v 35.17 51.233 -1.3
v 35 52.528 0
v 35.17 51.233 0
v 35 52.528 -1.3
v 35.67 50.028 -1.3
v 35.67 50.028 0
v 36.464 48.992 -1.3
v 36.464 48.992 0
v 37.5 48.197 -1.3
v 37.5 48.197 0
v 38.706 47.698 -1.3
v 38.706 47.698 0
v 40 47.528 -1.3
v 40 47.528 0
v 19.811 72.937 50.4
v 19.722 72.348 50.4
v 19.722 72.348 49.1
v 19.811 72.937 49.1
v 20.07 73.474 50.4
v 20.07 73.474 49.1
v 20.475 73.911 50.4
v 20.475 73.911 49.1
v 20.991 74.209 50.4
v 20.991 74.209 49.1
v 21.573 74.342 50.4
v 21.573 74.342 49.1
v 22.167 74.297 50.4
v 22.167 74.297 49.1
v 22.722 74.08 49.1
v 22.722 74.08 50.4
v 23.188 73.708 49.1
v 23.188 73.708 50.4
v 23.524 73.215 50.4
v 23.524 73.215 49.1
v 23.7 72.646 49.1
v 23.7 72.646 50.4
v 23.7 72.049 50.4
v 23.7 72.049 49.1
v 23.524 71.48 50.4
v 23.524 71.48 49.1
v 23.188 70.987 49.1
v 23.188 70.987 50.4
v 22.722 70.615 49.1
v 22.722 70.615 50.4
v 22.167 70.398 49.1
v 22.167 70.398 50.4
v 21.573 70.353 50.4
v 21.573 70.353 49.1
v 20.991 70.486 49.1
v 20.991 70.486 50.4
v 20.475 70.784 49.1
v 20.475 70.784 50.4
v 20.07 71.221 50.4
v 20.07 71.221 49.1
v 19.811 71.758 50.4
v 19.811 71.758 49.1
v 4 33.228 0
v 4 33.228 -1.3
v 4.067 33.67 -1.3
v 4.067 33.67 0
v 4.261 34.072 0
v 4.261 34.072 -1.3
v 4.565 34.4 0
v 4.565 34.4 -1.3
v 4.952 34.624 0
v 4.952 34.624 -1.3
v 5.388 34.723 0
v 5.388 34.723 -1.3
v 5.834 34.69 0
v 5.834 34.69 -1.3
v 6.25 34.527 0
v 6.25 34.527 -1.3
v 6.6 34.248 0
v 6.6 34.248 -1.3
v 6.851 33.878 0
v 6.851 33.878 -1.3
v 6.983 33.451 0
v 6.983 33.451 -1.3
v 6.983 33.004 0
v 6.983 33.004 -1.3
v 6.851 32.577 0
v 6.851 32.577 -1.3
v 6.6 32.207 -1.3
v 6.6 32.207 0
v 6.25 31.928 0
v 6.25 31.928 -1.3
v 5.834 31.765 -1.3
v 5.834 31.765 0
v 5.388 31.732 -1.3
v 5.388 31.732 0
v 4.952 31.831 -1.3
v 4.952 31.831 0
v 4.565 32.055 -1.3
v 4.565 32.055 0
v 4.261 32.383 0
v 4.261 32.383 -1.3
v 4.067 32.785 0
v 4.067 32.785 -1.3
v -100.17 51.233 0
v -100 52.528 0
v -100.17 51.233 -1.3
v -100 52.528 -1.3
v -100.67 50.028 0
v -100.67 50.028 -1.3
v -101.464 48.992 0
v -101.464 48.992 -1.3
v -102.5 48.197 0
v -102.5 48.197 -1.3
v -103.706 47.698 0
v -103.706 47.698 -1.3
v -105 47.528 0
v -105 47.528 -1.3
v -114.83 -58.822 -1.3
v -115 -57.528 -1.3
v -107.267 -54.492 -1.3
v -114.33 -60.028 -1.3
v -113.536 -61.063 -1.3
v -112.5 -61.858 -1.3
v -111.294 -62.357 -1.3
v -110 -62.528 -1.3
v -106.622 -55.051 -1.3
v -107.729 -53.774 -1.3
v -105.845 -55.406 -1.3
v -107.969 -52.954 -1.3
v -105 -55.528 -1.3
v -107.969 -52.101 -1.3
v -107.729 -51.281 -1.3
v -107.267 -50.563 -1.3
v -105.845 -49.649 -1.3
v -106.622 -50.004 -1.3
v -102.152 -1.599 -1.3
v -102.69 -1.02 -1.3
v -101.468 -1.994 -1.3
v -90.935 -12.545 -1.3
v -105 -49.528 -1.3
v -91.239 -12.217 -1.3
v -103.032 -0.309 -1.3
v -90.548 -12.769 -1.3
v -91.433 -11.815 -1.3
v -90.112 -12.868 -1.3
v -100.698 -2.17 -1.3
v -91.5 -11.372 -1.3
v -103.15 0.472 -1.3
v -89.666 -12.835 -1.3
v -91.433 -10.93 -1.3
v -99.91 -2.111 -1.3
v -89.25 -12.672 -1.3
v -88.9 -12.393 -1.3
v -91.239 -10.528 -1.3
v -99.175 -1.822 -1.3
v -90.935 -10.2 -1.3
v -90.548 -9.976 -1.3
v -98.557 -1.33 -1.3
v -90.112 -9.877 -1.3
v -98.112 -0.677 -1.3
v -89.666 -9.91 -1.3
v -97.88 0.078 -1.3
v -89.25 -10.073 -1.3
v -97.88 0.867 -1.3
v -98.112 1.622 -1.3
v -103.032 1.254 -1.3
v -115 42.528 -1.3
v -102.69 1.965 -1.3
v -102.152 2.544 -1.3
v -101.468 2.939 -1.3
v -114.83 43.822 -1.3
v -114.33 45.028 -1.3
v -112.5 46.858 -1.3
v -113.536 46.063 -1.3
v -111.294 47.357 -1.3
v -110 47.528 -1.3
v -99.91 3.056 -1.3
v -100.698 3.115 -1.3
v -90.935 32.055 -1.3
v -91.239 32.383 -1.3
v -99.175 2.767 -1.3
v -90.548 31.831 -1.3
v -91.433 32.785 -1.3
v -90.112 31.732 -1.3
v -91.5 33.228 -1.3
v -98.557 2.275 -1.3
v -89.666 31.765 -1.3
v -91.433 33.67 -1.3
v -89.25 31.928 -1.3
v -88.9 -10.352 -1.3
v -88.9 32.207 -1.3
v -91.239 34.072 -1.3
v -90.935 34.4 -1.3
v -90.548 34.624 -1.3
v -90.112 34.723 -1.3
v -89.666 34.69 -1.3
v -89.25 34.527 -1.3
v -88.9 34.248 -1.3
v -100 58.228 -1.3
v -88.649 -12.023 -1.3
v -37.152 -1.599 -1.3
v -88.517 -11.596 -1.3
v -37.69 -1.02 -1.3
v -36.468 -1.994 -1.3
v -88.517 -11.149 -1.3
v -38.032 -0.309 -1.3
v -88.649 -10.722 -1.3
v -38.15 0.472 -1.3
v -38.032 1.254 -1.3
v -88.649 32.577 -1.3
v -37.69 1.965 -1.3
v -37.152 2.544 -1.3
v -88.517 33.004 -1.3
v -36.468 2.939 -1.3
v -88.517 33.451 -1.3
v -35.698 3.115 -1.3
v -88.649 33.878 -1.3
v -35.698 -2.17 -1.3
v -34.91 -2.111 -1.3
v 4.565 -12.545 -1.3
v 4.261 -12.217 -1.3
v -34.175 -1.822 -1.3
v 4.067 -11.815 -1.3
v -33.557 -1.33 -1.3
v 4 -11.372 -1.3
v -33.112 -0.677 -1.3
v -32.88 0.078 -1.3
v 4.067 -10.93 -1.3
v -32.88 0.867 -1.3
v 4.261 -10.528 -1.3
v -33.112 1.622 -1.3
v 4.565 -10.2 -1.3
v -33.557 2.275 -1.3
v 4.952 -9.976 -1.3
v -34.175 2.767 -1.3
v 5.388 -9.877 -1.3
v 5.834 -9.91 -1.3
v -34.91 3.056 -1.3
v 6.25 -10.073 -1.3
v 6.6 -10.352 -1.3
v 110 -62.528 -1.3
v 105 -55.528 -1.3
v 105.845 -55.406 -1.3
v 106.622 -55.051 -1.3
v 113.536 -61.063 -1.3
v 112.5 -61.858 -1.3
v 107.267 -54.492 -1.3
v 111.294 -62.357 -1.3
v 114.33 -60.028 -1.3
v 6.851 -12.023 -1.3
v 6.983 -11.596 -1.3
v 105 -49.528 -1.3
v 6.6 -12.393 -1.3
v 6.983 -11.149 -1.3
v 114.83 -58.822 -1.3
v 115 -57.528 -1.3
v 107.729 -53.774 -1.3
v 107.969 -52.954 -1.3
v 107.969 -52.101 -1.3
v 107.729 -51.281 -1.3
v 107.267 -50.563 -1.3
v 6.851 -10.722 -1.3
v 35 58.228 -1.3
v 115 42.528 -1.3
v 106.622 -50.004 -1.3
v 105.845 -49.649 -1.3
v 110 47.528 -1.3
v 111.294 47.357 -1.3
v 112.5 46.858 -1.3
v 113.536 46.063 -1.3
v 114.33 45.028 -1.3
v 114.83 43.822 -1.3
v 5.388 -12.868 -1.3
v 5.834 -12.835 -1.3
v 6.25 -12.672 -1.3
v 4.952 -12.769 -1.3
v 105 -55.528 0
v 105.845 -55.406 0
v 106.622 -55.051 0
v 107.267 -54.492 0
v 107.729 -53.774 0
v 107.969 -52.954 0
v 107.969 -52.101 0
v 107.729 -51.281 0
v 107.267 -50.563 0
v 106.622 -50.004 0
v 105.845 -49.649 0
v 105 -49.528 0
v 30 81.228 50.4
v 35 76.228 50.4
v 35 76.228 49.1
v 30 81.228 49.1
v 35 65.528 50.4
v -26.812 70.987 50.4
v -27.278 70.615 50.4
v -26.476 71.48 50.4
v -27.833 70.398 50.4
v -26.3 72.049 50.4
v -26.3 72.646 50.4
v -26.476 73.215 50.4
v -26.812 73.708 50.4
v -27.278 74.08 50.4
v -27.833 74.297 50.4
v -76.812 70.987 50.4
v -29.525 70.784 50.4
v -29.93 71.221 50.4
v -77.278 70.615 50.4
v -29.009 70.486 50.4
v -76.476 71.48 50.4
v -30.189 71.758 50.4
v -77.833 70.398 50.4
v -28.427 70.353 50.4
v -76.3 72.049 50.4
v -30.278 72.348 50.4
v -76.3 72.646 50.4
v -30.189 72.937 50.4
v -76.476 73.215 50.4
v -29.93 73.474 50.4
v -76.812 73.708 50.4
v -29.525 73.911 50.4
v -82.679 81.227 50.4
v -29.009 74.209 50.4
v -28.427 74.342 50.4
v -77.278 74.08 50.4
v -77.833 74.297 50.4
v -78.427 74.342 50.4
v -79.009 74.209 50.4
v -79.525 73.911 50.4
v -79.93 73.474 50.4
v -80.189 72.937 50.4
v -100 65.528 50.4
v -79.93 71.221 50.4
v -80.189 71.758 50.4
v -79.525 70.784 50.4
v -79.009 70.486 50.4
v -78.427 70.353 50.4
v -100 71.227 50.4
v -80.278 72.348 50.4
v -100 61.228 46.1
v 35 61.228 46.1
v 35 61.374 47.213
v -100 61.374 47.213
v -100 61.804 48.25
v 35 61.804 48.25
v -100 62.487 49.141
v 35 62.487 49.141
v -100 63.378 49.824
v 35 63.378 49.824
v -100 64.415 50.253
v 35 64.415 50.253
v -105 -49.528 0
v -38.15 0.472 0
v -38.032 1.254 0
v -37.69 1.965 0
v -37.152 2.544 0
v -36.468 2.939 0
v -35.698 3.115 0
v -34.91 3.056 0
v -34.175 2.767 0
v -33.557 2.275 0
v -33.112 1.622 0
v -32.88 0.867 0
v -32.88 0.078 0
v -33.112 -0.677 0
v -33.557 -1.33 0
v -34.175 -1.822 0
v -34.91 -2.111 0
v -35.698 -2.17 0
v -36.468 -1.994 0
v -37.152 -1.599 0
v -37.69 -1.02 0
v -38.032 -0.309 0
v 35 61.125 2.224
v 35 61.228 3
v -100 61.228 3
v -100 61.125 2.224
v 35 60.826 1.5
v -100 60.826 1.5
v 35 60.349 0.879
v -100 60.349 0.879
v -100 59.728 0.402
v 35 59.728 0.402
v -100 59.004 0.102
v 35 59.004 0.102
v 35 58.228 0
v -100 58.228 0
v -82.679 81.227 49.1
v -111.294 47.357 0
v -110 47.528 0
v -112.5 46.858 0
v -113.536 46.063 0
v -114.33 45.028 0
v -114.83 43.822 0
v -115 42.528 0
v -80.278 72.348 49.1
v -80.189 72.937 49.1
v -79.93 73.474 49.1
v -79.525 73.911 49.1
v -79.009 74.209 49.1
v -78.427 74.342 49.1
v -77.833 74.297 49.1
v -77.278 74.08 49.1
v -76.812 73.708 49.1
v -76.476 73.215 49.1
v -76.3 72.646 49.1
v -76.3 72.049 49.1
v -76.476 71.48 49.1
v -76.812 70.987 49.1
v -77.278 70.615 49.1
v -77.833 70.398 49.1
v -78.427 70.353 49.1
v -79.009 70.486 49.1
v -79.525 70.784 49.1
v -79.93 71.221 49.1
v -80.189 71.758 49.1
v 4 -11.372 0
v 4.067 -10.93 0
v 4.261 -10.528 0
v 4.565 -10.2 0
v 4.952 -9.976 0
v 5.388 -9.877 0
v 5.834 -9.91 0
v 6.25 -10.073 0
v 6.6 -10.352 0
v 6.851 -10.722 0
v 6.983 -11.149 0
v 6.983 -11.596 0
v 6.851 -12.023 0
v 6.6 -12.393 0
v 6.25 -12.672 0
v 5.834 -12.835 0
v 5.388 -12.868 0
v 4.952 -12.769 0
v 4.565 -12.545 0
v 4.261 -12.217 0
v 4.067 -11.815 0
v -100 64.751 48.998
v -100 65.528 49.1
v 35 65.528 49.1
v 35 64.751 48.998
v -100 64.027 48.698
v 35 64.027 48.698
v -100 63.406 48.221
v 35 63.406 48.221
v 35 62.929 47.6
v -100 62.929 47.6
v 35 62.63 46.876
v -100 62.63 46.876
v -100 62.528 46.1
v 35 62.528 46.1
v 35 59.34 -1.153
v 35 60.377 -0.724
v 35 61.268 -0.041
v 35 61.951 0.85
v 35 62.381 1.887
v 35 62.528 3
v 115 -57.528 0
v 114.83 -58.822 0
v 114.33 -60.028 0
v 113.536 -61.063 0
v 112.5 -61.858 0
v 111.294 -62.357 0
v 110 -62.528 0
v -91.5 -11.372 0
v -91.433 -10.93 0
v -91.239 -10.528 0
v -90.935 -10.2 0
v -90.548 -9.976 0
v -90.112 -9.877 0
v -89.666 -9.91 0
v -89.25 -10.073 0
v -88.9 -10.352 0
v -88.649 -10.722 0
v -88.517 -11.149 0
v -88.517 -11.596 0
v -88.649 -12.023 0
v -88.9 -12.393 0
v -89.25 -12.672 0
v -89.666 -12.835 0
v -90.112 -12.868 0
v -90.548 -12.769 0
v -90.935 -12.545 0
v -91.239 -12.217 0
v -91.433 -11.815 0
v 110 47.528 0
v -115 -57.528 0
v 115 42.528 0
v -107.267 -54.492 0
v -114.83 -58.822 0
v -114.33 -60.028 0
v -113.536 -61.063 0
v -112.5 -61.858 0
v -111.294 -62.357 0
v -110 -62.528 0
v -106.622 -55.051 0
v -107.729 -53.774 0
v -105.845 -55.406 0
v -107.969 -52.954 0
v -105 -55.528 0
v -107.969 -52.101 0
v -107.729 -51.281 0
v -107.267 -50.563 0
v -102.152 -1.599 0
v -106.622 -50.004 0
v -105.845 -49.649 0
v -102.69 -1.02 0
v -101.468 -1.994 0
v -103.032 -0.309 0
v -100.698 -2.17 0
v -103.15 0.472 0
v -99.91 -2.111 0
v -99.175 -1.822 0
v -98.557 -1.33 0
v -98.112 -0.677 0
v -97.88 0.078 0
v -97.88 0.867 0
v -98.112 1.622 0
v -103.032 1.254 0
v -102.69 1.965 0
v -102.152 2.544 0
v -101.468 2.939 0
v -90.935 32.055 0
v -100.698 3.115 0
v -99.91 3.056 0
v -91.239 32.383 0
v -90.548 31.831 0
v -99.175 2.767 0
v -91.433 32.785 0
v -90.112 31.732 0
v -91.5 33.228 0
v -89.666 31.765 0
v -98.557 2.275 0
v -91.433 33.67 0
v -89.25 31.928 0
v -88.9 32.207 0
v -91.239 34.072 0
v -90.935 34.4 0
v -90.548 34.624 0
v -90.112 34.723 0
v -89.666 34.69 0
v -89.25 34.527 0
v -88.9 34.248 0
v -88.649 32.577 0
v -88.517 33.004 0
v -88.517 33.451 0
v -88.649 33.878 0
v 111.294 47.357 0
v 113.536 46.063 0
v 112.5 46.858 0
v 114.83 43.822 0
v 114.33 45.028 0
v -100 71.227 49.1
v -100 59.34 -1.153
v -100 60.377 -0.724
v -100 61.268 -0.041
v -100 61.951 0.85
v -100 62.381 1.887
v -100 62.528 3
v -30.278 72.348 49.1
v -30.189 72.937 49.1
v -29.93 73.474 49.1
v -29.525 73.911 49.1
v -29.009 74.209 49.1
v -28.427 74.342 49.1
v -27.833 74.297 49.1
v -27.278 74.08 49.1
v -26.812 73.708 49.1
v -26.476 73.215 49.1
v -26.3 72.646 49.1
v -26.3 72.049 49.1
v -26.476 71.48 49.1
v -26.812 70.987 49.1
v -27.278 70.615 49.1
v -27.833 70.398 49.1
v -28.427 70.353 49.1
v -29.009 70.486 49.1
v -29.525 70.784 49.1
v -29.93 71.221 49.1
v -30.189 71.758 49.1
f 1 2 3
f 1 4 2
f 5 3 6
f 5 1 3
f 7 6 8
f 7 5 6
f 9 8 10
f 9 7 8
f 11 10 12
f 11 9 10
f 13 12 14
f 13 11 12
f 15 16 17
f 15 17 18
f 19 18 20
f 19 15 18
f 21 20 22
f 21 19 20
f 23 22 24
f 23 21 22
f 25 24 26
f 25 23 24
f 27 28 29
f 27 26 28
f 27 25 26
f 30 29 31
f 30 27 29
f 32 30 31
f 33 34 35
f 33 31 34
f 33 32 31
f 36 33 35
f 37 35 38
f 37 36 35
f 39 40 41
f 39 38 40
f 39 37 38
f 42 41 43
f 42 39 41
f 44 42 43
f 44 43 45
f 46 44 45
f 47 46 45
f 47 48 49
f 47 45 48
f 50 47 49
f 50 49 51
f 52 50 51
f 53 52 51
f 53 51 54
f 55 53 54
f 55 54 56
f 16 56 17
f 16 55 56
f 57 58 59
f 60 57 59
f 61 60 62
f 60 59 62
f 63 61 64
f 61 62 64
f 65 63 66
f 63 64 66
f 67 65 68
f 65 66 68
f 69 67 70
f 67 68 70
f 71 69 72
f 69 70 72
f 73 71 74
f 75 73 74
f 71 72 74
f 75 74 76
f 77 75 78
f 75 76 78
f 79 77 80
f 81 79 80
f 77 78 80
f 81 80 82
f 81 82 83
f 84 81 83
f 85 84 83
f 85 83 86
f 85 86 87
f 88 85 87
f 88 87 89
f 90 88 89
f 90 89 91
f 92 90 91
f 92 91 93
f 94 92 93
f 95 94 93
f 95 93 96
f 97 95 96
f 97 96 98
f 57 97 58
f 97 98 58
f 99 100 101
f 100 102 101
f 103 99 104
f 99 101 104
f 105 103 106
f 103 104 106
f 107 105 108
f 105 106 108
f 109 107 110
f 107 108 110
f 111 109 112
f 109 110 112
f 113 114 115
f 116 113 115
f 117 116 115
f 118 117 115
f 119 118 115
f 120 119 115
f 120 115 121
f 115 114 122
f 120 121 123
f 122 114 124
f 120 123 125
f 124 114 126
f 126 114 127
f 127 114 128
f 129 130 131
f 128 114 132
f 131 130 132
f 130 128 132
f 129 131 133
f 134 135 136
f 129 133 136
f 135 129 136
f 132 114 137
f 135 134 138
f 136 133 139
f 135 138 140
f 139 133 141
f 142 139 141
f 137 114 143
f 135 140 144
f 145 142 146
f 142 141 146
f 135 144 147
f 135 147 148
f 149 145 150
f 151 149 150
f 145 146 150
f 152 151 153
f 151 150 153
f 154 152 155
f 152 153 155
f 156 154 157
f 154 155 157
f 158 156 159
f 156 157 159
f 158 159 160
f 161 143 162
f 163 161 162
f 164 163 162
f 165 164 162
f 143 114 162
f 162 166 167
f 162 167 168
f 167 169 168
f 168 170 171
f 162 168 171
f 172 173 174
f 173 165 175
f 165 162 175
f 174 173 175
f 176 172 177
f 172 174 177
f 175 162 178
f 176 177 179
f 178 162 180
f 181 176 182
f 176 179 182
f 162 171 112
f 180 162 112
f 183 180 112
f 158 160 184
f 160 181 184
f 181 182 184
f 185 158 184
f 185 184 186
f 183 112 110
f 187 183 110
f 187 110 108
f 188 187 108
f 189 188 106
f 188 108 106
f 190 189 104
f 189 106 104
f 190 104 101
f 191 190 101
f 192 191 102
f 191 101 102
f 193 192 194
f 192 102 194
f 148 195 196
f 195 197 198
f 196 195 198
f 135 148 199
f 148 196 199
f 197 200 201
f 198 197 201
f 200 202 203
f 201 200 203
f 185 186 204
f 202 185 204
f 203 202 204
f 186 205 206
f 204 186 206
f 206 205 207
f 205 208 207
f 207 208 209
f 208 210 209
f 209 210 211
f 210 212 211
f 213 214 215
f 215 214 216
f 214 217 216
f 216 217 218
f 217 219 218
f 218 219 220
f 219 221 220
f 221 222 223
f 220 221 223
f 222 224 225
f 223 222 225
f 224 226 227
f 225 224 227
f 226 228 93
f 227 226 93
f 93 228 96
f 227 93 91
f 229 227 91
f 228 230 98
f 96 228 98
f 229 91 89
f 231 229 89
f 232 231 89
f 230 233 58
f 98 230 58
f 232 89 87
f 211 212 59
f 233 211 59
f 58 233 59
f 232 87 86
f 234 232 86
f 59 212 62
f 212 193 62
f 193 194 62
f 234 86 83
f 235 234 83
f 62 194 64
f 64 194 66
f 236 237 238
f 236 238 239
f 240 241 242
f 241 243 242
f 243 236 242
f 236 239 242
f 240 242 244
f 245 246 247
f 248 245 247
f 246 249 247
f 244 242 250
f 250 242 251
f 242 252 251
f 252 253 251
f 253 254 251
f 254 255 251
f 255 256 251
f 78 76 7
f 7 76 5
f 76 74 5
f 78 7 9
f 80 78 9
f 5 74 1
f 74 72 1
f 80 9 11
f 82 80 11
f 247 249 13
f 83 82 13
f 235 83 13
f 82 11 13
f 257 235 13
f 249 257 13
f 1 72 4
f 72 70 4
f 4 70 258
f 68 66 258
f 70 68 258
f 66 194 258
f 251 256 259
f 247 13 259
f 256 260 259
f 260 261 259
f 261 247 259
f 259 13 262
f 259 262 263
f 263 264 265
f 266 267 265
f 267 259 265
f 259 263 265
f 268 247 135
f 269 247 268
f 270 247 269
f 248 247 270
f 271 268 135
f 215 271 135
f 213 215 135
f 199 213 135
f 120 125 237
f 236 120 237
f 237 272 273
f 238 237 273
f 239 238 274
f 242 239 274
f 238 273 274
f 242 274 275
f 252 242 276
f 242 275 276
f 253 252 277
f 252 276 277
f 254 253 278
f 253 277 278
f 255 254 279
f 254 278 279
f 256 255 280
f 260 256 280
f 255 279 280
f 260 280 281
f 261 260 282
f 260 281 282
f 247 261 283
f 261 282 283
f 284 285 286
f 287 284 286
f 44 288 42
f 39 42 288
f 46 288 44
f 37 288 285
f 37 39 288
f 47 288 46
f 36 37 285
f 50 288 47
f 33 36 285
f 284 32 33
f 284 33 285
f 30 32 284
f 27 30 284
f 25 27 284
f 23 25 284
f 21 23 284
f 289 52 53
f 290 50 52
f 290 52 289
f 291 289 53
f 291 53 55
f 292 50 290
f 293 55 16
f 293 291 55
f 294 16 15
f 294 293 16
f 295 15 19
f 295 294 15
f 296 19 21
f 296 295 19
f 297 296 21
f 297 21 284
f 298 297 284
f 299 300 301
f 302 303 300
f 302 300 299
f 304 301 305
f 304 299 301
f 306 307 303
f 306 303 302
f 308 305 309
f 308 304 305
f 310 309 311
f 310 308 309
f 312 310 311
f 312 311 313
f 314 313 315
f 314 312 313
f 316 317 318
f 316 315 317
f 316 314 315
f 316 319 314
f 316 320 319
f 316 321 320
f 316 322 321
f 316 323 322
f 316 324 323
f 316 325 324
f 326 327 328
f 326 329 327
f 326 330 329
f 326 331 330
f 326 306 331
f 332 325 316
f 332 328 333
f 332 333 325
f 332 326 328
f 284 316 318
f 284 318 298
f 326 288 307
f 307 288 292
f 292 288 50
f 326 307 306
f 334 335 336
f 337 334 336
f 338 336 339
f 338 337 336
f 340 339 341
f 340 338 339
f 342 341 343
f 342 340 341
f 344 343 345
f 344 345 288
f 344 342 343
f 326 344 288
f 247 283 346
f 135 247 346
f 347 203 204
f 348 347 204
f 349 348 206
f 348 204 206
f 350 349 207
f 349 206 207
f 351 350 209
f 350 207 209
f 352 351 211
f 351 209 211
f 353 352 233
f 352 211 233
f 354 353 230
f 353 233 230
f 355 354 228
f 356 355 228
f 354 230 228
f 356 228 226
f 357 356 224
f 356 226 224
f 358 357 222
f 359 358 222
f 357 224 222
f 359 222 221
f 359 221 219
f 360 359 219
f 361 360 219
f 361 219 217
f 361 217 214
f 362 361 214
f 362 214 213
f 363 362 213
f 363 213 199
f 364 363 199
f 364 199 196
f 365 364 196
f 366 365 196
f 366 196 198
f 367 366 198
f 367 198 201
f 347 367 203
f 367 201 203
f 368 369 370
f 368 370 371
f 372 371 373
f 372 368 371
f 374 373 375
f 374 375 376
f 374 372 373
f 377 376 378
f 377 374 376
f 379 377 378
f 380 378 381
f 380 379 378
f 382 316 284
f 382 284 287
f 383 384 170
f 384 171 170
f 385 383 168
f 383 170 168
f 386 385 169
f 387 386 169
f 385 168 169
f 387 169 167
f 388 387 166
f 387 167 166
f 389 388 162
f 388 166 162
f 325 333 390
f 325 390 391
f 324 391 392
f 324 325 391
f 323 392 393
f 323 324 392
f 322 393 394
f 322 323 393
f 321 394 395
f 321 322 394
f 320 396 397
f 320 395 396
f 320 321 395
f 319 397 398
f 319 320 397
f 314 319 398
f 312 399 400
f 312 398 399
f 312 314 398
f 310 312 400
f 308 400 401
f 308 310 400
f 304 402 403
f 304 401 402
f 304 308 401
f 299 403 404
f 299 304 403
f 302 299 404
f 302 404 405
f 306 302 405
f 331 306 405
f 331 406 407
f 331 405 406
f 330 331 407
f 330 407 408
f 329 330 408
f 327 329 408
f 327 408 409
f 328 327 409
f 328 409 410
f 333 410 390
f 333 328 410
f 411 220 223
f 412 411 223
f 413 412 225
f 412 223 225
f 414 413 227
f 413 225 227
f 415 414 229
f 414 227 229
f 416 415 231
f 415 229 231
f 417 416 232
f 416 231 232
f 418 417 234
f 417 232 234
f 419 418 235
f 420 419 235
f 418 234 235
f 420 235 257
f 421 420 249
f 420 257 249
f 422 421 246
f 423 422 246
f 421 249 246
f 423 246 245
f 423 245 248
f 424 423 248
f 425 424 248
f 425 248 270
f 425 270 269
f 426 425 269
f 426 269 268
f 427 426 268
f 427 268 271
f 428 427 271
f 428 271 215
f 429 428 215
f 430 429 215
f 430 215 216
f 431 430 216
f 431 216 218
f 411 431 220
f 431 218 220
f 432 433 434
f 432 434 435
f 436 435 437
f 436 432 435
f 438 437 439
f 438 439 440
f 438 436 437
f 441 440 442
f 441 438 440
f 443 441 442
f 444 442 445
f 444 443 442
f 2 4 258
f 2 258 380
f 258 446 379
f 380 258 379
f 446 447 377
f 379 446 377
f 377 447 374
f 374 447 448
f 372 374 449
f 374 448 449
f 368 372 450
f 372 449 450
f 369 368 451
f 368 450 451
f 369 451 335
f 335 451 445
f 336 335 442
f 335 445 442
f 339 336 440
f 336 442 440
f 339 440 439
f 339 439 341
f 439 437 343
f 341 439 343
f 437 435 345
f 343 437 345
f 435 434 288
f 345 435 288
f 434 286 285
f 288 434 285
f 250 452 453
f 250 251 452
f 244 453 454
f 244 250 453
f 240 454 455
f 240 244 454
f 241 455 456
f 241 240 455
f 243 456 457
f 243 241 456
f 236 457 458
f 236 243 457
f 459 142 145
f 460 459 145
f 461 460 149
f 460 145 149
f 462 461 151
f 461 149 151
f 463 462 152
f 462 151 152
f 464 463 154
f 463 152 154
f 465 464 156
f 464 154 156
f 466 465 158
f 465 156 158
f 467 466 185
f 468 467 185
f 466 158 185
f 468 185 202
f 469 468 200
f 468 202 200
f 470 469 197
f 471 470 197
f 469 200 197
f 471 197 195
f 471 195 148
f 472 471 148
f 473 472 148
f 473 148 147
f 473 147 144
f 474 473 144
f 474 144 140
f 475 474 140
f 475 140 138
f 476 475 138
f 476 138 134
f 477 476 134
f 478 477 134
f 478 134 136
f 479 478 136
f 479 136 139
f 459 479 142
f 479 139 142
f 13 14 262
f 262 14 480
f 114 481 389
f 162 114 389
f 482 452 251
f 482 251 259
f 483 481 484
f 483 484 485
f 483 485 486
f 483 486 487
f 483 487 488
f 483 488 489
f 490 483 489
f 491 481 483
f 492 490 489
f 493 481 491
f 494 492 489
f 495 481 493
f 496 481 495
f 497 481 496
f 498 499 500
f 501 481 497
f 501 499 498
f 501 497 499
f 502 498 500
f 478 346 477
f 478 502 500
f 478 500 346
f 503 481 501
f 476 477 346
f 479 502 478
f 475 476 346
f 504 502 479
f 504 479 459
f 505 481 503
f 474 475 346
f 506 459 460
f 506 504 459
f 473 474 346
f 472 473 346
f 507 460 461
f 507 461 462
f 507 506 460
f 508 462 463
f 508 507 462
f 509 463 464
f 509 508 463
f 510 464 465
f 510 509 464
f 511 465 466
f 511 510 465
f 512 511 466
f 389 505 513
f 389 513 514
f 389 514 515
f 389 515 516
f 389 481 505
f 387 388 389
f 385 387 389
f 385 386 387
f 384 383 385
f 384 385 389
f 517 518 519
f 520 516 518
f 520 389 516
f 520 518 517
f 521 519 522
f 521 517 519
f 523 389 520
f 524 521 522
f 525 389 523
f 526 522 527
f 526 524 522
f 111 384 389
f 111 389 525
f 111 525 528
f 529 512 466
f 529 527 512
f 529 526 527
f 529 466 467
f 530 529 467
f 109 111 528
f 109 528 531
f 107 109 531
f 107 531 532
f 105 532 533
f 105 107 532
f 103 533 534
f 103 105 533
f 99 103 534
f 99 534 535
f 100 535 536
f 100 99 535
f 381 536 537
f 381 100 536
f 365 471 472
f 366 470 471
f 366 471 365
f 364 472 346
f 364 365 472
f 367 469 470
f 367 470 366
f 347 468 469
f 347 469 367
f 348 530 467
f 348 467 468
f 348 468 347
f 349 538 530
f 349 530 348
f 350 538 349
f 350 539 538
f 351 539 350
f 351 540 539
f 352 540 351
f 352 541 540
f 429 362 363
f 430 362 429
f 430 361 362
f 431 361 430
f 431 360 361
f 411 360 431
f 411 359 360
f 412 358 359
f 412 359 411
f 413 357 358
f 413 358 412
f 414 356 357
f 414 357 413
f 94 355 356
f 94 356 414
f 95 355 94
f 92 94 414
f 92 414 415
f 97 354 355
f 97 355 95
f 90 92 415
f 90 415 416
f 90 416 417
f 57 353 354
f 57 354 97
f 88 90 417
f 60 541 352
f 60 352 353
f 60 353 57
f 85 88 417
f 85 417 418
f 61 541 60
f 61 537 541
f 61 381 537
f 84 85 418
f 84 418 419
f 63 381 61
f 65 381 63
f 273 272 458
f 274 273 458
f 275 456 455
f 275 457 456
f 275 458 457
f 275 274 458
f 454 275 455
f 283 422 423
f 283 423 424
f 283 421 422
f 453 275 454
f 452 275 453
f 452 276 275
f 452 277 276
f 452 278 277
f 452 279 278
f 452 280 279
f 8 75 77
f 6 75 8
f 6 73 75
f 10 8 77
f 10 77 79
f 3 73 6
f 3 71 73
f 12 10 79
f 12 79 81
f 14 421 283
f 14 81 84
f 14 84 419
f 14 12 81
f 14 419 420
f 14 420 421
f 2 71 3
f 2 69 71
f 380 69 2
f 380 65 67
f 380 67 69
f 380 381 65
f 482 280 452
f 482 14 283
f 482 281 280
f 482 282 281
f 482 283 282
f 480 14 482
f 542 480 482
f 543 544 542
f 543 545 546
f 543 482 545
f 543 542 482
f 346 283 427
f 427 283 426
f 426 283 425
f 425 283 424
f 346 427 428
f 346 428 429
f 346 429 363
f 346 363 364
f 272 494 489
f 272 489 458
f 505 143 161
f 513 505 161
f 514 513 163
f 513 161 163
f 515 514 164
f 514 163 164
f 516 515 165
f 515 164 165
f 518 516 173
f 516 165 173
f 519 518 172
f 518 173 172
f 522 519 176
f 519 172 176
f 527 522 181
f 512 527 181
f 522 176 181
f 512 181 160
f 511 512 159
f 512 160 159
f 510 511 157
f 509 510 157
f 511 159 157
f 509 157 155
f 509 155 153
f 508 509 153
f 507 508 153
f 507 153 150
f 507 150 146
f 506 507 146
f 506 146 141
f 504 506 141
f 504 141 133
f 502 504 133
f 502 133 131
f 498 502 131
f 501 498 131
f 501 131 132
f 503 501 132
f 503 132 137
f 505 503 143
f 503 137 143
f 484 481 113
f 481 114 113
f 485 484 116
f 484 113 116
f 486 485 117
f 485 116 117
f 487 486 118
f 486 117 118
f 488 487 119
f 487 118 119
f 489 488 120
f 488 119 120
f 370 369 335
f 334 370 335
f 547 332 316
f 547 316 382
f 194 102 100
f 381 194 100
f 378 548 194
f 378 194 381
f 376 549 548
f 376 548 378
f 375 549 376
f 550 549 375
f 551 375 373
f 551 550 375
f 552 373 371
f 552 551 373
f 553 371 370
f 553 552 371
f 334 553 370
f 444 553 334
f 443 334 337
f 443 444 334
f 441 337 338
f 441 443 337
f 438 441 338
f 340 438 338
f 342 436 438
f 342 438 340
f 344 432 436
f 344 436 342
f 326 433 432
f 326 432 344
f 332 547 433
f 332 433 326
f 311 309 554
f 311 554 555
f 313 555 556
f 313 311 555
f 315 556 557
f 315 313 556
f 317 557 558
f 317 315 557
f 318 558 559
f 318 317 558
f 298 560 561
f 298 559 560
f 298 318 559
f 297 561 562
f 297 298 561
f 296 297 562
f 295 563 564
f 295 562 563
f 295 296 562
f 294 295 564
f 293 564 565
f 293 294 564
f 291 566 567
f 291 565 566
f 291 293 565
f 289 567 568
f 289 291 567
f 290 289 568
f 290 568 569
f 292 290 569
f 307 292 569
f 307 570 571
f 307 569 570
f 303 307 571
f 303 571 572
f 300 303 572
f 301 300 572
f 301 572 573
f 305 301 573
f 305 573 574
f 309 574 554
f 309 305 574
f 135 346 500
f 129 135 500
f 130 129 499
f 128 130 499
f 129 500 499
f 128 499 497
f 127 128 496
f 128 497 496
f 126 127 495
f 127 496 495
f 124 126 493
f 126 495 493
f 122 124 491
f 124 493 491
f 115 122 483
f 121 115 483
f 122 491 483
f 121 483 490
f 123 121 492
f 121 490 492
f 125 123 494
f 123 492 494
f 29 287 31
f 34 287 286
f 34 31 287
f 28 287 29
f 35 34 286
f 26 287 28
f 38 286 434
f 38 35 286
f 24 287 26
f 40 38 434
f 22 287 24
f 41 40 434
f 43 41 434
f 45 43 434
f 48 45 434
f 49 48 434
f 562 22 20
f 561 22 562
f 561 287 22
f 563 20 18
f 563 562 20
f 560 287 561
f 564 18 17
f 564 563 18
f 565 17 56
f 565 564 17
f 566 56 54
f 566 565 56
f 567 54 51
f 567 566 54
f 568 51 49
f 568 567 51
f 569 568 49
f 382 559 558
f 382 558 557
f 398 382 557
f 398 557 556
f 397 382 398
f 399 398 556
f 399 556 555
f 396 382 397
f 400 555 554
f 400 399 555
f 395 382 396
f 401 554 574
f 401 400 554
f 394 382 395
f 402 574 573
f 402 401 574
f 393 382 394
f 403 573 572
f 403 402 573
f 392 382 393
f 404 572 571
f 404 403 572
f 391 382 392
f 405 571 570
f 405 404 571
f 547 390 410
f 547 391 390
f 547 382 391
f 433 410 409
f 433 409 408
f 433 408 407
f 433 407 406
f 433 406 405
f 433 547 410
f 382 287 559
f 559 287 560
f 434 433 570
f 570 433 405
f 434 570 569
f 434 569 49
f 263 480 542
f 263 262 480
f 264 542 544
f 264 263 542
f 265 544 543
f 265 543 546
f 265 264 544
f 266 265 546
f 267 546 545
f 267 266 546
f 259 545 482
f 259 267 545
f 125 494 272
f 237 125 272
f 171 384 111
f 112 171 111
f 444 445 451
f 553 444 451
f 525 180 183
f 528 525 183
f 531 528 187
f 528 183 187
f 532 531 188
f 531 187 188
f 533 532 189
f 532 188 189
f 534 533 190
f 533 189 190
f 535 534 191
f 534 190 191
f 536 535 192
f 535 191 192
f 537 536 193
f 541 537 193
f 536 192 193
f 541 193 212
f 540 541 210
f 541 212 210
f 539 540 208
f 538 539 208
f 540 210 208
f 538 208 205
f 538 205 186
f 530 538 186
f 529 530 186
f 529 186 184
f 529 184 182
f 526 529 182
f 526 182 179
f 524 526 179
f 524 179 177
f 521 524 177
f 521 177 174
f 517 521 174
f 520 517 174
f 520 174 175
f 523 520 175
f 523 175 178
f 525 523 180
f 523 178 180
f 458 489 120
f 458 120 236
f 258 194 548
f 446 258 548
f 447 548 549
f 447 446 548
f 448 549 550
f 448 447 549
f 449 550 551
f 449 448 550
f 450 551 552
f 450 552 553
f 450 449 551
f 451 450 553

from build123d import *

# Parameters (mm, degrees)
SKETCH1_W                    = 230
SKETCH1_H                    = 125.055
BASE_FLANGE1_DEPTH           = 1.3
SKETCH12_W                   = 80
SKETCH12_H                   = 15
SKETCH12_W_2                 = 15
CUT_EXTRUDE1_DEPTH           = 131.905990147
EDGE_FLANGE1_STRIP_W         = 11.2
EDGE_FLANGE1_STRIP_H         = 1.3
EDGE_FLANGE1_STRIP_CUT_DEPTH = 135
EDGE_FLANGE1_DEPTH           = 135
EDGE_FLANGE2_DEPTH           = 135
CHAMFER1_SIZE                = 10
CHAMFER1_SIZE2               = 17.320508076
CHAMFER3_SIZE                = 5
FILLET1_R                    = 5
CUT_EXTRUDE3_DEPTH           = 150.542859262
CUT_EXTRUDE3_DEPTH_BACK      = 150.542859262
SKETCH14_R                   = 2
SKETCH15_R                   = 2.65
CUT_EXTRUDE4_DEPTH           = 1.3
SKETCH16_R                   = 1.5
CUT_EXTRUDE5_DEPTH           = 1.3


# Sheet-metal steps are written as plain solids
with BuildPart() as part:
    # Sketch1 → Base-Flange1 (new body)
    with BuildSketch(Plane.XY):
        Rectangle(SKETCH1_W, SKETCH1_H)
    extrude(amount=-BASE_FLANGE1_DEPTH)

    # Sketch12 → Cut-Extrude1 (cut, through all)
    with BuildSketch(Plane.XY):
        with Locations((75, 55.0275)):
            Rectangle(SKETCH12_W, SKETCH12_H)
        with Locations((-107.5, 55.0275)):
            Rectangle(SKETCH12_W_2, SKETCH12_H)
    extrude(amount=-CUT_EXTRUDE1_DEPTH, mode=Mode.SUBTRACT)

    # Edge-Flange1 strip (across the edge) → Edge-Flange1 strip cut (cut)
    with BuildSketch(Plane(origin=(35, 62.5275, 0), x_dir=(0, -1, 0), z_dir=(-1, 0, 0))):
        with Locations((-1.3, -0.65)):
            Rectangle(EDGE_FLANGE1_STRIP_W, EDGE_FLANGE1_STRIP_H)
    extrude(amount=EDGE_FLANGE1_STRIP_CUT_DEPTH, mode=Mode.SUBTRACT)

    # Edge-Flange1 section (across the edge) → Edge-Flange1 (add)
    with BuildSketch(Plane(origin=(35, 62.5275, 0), x_dir=(0, -1, 0), z_dir=(-1, 0, 0))):
        with BuildLine():
            Line((0, 3), (0, 40.4))
            Line((0, 40.4), (1.3, 40.4))
            Line((1.3, 40.4), (1.3, 3))
            ThreePointArc((1.3, 3), (2.178679656, 0.878679656), (4.3, 0))
            Line((4.3, 0), (4.3, -1.3))
            ThreePointArc((4.3, -1.3), (1.259440841, -0.040559159), (0, 3))
        make_face()
    extrude(amount=EDGE_FLANGE1_DEPTH)

    # Edge-Flange2 section (across the edge) → Edge-Flange2 (add)
    with BuildSketch(Plane(origin=(-100, 62.5275, 50.4), x_dir=(0, 0, -1), z_dir=(1, 0, 0))):
        with BuildLine():
            Line((0, 3), (0, 18.7))
            Line((0, 18.7), (1.3, 18.7))
            Line((1.3, 18.7), (1.3, 3))
            ThreePointArc((1.3, 3), (2.178679656, 0.878679656), (4.3, 0))
            Line((4.3, 0), (10, 0))
            Line((10, 0), (10, -1.3))
            Line((10, -1.3), (4.3, -1.3))
            ThreePointArc((4.3, -1.3), (1.259440841, -0.040559159), (0, 3))
        make_face()
    extrude(amount=EDGE_FLANGE2_DEPTH)

    # Chamfer1
    chamfer1_edges = [part.edges().sort_by_distance(p)[0] for p in [
        (-100, 81.2275, 49.75),
    ]]
    chamfer1_side = [part.faces().sort_by_distance(p)[0] for p in [
        (-100, 52.8775, -0.617136938),
    ]]
    chamfer(chamfer1_edges, length=CHAMFER1_SIZE, length2=CHAMFER1_SIZE2, reference=chamfer1_side[0])

    # Chamfer3
    chamfer3_edges = [part.edges().sort_by_distance(p)[0] for p in [
        (35, 81.2275, 49.75),
    ]]
    chamfer(chamfer3_edges, length=CHAMFER3_SIZE)

    # Fillet1
    fillet1_edges = [part.edges().sort_by_distance(p)[0] for p in [
        (115, 47.5275, -0.65),
        (35, 47.5275, -0.65),
        (-115, 47.5275, -0.65),
        (-100, 47.5275, -0.65),
        (115, -62.5275, -0.65),
        (-115, -62.5275, -0.65),
    ]]
    fillet(fillet1_edges, radius=FILLET1_R)

    # Sketch14 → Cut-Extrude3 (cut, two sides: drawn at the far end of the back side and taken through both)
    with BuildSketch(Plane(origin=(0, 0, 49.1), x_dir=(-1, 0, 0), z_dir=(0, 0, -1)).offset(-CUT_EXTRUDE3_DEPTH_BACK)):
        with Locations((-21.722047565, 72.3475)):
            Circle(SKETCH14_R)
        with Locations((28.277952435, 72.3475)):
            Circle(SKETCH14_R)
        with Locations((78.277952435, 72.3475)):
            Circle(SKETCH14_R)
        with BuildLine():
            Line((-105, -49.5275), (105, -49.5275))
            ThreePointArc((105, -49.5275), (108, -52.5275), (105, -55.5275))
            Line((105, -55.5275), (-105, -55.5275))
            ThreePointArc((-105, -55.5275), (-108, -52.5275), (-105, -49.5275))
        make_face()
    extrude(amount=CUT_EXTRUDE3_DEPTH + CUT_EXTRUDE3_DEPTH_BACK, mode=Mode.SUBTRACT)

    # Sketch15 → Cut-Extrude4 (cut)
    with BuildSketch(Plane(origin=(0, 0, -1.3), x_dir=(-1, 0, 0), z_dir=(0, 0, -1))):
        with Locations((35.5, 0.4725)):
            Circle(SKETCH15_R)
        with Locations((100.5, 0.4725)):
            Circle(SKETCH15_R)
    extrude(amount=-CUT_EXTRUDE4_DEPTH, mode=Mode.SUBTRACT)

    # Sketch16 → Cut-Extrude5 (cut)
    with BuildSketch(Plane(origin=(0, 0, -1.3), x_dir=(-1, 0, 0), z_dir=(0, 0, -1))):
        with Locations((90, 33.2275)):
            Circle(SKETCH16_R)
        with Locations((-5.5, 33.2275)):
            Circle(SKETCH16_R)
        with Locations((-5.5, -11.3725)):
            Circle(SKETCH16_R)
        with Locations((90, -11.3725)):
            Circle(SKETCH16_R)
    extrude(amount=-CUT_EXTRUDE5_DEPTH, mode=Mode.SUBTRACT)


solid = part.part
